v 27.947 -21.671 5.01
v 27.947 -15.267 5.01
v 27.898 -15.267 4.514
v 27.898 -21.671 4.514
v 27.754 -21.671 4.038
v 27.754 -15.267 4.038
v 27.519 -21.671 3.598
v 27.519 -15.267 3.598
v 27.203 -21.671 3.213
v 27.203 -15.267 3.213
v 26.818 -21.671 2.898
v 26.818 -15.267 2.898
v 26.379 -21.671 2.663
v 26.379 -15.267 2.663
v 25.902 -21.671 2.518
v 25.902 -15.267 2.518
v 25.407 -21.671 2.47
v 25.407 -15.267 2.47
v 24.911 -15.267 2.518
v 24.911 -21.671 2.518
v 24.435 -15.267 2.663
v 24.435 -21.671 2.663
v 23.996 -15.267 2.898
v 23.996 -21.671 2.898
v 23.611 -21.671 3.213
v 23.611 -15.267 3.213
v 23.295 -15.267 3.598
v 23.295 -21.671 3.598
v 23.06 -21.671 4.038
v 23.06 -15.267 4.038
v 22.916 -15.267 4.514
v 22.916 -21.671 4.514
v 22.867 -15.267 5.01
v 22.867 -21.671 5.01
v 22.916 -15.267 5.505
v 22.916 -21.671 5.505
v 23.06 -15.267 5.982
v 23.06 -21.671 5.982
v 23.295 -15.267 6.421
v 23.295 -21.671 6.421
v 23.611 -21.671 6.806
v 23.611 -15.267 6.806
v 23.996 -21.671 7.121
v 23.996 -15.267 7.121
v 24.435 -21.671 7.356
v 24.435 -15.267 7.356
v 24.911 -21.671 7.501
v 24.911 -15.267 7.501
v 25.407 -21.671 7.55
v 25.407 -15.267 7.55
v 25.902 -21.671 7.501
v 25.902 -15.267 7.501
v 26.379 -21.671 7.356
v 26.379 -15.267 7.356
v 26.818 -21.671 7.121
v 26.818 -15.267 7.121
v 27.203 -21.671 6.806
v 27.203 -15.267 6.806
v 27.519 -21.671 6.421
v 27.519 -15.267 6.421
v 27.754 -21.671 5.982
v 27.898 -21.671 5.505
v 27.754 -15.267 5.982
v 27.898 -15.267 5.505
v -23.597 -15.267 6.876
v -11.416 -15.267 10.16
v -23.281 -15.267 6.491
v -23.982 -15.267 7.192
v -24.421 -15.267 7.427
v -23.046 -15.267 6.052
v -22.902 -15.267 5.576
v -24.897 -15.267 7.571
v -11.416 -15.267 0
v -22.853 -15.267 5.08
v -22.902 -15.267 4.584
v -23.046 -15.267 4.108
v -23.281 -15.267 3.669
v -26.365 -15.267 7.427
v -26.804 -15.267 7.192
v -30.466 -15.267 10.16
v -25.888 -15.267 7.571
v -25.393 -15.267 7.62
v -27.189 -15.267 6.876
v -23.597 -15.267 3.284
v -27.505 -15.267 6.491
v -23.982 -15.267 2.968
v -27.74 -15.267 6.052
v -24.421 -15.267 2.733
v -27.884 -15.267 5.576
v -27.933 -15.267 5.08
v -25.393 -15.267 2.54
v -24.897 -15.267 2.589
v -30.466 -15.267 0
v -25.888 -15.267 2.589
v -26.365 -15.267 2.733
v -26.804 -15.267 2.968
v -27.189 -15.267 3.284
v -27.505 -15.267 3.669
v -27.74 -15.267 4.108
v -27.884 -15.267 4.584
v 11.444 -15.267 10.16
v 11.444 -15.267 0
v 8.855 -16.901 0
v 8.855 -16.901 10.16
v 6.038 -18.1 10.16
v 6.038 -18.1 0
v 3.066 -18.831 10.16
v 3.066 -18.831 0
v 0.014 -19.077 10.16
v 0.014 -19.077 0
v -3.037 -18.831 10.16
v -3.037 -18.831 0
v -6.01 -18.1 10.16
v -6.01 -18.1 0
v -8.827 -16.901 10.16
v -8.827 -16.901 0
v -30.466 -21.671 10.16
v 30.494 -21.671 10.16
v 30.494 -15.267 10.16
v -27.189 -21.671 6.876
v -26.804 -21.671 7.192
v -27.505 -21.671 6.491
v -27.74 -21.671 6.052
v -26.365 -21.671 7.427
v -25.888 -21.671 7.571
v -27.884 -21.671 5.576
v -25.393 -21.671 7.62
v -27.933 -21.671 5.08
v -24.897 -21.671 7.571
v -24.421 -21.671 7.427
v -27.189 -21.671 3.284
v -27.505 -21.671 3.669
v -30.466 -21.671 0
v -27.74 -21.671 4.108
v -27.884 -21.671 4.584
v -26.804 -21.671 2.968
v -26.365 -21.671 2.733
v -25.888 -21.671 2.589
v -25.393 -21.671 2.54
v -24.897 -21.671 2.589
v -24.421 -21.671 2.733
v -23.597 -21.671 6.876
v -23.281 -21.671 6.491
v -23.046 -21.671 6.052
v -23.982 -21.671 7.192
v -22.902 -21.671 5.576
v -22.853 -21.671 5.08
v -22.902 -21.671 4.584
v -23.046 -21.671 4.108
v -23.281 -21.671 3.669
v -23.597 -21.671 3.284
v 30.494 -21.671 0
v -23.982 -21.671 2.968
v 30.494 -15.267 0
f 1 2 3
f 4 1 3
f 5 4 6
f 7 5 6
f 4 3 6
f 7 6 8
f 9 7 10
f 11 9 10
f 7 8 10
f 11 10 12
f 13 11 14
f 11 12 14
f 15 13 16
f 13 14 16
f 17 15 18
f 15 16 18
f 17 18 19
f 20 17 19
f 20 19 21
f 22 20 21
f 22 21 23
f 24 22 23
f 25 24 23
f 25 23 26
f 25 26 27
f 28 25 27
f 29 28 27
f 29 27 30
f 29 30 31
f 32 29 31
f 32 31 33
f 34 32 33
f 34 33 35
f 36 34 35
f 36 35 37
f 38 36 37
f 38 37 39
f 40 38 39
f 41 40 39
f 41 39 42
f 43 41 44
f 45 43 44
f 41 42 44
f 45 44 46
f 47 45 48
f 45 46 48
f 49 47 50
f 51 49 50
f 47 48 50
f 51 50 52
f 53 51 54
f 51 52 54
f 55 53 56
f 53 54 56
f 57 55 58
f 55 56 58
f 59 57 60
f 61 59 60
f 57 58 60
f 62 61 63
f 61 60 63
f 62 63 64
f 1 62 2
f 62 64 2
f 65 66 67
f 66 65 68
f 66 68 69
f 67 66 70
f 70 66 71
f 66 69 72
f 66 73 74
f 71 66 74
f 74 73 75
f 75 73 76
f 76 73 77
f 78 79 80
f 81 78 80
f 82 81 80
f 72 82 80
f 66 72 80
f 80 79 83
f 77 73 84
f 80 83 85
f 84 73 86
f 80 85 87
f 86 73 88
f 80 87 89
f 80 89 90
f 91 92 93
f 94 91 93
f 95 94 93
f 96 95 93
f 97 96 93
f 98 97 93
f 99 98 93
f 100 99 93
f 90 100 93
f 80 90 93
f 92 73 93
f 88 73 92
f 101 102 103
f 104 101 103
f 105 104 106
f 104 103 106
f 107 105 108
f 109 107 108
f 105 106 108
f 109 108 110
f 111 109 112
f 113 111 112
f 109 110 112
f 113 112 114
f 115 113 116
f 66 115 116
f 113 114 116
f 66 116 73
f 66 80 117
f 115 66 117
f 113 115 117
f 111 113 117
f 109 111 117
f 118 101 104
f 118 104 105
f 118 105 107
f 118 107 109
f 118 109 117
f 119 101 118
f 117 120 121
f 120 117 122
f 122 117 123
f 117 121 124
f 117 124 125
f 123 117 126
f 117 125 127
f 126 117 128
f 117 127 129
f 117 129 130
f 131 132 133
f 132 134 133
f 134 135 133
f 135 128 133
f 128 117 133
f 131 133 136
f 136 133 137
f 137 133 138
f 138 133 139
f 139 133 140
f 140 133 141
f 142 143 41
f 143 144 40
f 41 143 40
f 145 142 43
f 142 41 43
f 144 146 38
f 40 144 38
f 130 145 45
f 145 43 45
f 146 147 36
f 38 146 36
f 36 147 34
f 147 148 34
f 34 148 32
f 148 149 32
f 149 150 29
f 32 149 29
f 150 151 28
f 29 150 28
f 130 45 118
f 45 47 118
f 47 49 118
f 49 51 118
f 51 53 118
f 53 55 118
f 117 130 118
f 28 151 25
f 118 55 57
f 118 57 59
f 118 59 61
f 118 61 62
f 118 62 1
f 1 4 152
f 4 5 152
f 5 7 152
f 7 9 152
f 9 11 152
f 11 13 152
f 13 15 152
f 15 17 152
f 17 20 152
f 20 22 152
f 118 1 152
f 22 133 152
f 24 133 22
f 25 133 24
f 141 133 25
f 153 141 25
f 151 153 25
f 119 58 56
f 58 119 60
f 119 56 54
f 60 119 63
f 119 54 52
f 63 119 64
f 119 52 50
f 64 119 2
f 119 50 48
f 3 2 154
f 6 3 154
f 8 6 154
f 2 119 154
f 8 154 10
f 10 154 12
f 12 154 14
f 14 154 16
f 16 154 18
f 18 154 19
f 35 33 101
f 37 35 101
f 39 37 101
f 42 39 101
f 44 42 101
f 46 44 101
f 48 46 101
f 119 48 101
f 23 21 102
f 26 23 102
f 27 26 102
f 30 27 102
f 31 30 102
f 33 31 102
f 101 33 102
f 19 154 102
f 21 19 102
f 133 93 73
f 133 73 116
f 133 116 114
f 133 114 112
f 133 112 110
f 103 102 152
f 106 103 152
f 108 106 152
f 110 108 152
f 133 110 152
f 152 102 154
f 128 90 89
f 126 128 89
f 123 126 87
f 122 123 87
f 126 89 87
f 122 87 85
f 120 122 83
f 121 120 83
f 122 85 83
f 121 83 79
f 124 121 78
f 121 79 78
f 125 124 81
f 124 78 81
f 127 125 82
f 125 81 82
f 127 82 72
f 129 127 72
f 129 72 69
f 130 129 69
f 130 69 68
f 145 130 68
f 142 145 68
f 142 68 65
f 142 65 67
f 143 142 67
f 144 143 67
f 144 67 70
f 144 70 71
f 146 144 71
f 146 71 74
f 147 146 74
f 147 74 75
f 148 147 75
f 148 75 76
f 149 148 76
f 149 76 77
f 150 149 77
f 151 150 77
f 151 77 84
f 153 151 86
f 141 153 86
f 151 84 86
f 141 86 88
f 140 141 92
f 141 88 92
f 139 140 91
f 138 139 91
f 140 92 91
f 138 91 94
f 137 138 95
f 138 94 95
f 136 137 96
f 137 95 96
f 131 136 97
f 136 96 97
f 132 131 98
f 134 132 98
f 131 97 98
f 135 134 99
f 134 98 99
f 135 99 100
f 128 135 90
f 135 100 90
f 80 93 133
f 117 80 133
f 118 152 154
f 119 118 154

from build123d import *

# Parameters (mm, degrees)
BOSS_EXTRUDE1_DEPTH = 10.16
SKETCH2_R           = 2.54
CUT_EXTRUDE1_DEPTH  = 33.773906903


with BuildPart() as part:
    # Sketch1 → Boss-Extrude1 (new body)
    with BuildSketch(Plane.XY):
        with BuildLine():
            Line((-11.415908645, -15.267119982), (-30.465908645, -15.267119982))
            Line((-30.465908645, -15.267119982), (-30.465908645, -21.671319081))
            Line((-30.465908645, -21.671319081), (30.494091355, -21.671319081))
            Line((30.494091355, -21.671319081), (30.494091355, -15.267119982))
            Line((30.494091355, -15.267119982), (11.444091355, -15.267119982))
            ThreePointArc((11.444091355, -15.267119982), (0.014091355, -19.077119982), (-11.415908645, -15.267119982))
        make_face()
    extrude(amount=BOSS_EXTRUDE1_DEPTH)

    # Sketch2 → Cut-Extrude1 (cut, through all)
    with BuildSketch(Plane(origin=(0, -15.267119982, 0), x_dir=(1, 0, 0), z_dir=(0, 1, 0))):
        with Locations(Location((-25.392954322, -5.08, 0), (0, 0, 180))):
            Circle(SKETCH2_R)
        with Locations((25.406947958, -5.00954336)):
            Circle(SKETCH2_R)
    extrude(amount=-CUT_EXTRUDE1_DEPTH, mode=Mode.SUBTRACT)


solid = part.part
